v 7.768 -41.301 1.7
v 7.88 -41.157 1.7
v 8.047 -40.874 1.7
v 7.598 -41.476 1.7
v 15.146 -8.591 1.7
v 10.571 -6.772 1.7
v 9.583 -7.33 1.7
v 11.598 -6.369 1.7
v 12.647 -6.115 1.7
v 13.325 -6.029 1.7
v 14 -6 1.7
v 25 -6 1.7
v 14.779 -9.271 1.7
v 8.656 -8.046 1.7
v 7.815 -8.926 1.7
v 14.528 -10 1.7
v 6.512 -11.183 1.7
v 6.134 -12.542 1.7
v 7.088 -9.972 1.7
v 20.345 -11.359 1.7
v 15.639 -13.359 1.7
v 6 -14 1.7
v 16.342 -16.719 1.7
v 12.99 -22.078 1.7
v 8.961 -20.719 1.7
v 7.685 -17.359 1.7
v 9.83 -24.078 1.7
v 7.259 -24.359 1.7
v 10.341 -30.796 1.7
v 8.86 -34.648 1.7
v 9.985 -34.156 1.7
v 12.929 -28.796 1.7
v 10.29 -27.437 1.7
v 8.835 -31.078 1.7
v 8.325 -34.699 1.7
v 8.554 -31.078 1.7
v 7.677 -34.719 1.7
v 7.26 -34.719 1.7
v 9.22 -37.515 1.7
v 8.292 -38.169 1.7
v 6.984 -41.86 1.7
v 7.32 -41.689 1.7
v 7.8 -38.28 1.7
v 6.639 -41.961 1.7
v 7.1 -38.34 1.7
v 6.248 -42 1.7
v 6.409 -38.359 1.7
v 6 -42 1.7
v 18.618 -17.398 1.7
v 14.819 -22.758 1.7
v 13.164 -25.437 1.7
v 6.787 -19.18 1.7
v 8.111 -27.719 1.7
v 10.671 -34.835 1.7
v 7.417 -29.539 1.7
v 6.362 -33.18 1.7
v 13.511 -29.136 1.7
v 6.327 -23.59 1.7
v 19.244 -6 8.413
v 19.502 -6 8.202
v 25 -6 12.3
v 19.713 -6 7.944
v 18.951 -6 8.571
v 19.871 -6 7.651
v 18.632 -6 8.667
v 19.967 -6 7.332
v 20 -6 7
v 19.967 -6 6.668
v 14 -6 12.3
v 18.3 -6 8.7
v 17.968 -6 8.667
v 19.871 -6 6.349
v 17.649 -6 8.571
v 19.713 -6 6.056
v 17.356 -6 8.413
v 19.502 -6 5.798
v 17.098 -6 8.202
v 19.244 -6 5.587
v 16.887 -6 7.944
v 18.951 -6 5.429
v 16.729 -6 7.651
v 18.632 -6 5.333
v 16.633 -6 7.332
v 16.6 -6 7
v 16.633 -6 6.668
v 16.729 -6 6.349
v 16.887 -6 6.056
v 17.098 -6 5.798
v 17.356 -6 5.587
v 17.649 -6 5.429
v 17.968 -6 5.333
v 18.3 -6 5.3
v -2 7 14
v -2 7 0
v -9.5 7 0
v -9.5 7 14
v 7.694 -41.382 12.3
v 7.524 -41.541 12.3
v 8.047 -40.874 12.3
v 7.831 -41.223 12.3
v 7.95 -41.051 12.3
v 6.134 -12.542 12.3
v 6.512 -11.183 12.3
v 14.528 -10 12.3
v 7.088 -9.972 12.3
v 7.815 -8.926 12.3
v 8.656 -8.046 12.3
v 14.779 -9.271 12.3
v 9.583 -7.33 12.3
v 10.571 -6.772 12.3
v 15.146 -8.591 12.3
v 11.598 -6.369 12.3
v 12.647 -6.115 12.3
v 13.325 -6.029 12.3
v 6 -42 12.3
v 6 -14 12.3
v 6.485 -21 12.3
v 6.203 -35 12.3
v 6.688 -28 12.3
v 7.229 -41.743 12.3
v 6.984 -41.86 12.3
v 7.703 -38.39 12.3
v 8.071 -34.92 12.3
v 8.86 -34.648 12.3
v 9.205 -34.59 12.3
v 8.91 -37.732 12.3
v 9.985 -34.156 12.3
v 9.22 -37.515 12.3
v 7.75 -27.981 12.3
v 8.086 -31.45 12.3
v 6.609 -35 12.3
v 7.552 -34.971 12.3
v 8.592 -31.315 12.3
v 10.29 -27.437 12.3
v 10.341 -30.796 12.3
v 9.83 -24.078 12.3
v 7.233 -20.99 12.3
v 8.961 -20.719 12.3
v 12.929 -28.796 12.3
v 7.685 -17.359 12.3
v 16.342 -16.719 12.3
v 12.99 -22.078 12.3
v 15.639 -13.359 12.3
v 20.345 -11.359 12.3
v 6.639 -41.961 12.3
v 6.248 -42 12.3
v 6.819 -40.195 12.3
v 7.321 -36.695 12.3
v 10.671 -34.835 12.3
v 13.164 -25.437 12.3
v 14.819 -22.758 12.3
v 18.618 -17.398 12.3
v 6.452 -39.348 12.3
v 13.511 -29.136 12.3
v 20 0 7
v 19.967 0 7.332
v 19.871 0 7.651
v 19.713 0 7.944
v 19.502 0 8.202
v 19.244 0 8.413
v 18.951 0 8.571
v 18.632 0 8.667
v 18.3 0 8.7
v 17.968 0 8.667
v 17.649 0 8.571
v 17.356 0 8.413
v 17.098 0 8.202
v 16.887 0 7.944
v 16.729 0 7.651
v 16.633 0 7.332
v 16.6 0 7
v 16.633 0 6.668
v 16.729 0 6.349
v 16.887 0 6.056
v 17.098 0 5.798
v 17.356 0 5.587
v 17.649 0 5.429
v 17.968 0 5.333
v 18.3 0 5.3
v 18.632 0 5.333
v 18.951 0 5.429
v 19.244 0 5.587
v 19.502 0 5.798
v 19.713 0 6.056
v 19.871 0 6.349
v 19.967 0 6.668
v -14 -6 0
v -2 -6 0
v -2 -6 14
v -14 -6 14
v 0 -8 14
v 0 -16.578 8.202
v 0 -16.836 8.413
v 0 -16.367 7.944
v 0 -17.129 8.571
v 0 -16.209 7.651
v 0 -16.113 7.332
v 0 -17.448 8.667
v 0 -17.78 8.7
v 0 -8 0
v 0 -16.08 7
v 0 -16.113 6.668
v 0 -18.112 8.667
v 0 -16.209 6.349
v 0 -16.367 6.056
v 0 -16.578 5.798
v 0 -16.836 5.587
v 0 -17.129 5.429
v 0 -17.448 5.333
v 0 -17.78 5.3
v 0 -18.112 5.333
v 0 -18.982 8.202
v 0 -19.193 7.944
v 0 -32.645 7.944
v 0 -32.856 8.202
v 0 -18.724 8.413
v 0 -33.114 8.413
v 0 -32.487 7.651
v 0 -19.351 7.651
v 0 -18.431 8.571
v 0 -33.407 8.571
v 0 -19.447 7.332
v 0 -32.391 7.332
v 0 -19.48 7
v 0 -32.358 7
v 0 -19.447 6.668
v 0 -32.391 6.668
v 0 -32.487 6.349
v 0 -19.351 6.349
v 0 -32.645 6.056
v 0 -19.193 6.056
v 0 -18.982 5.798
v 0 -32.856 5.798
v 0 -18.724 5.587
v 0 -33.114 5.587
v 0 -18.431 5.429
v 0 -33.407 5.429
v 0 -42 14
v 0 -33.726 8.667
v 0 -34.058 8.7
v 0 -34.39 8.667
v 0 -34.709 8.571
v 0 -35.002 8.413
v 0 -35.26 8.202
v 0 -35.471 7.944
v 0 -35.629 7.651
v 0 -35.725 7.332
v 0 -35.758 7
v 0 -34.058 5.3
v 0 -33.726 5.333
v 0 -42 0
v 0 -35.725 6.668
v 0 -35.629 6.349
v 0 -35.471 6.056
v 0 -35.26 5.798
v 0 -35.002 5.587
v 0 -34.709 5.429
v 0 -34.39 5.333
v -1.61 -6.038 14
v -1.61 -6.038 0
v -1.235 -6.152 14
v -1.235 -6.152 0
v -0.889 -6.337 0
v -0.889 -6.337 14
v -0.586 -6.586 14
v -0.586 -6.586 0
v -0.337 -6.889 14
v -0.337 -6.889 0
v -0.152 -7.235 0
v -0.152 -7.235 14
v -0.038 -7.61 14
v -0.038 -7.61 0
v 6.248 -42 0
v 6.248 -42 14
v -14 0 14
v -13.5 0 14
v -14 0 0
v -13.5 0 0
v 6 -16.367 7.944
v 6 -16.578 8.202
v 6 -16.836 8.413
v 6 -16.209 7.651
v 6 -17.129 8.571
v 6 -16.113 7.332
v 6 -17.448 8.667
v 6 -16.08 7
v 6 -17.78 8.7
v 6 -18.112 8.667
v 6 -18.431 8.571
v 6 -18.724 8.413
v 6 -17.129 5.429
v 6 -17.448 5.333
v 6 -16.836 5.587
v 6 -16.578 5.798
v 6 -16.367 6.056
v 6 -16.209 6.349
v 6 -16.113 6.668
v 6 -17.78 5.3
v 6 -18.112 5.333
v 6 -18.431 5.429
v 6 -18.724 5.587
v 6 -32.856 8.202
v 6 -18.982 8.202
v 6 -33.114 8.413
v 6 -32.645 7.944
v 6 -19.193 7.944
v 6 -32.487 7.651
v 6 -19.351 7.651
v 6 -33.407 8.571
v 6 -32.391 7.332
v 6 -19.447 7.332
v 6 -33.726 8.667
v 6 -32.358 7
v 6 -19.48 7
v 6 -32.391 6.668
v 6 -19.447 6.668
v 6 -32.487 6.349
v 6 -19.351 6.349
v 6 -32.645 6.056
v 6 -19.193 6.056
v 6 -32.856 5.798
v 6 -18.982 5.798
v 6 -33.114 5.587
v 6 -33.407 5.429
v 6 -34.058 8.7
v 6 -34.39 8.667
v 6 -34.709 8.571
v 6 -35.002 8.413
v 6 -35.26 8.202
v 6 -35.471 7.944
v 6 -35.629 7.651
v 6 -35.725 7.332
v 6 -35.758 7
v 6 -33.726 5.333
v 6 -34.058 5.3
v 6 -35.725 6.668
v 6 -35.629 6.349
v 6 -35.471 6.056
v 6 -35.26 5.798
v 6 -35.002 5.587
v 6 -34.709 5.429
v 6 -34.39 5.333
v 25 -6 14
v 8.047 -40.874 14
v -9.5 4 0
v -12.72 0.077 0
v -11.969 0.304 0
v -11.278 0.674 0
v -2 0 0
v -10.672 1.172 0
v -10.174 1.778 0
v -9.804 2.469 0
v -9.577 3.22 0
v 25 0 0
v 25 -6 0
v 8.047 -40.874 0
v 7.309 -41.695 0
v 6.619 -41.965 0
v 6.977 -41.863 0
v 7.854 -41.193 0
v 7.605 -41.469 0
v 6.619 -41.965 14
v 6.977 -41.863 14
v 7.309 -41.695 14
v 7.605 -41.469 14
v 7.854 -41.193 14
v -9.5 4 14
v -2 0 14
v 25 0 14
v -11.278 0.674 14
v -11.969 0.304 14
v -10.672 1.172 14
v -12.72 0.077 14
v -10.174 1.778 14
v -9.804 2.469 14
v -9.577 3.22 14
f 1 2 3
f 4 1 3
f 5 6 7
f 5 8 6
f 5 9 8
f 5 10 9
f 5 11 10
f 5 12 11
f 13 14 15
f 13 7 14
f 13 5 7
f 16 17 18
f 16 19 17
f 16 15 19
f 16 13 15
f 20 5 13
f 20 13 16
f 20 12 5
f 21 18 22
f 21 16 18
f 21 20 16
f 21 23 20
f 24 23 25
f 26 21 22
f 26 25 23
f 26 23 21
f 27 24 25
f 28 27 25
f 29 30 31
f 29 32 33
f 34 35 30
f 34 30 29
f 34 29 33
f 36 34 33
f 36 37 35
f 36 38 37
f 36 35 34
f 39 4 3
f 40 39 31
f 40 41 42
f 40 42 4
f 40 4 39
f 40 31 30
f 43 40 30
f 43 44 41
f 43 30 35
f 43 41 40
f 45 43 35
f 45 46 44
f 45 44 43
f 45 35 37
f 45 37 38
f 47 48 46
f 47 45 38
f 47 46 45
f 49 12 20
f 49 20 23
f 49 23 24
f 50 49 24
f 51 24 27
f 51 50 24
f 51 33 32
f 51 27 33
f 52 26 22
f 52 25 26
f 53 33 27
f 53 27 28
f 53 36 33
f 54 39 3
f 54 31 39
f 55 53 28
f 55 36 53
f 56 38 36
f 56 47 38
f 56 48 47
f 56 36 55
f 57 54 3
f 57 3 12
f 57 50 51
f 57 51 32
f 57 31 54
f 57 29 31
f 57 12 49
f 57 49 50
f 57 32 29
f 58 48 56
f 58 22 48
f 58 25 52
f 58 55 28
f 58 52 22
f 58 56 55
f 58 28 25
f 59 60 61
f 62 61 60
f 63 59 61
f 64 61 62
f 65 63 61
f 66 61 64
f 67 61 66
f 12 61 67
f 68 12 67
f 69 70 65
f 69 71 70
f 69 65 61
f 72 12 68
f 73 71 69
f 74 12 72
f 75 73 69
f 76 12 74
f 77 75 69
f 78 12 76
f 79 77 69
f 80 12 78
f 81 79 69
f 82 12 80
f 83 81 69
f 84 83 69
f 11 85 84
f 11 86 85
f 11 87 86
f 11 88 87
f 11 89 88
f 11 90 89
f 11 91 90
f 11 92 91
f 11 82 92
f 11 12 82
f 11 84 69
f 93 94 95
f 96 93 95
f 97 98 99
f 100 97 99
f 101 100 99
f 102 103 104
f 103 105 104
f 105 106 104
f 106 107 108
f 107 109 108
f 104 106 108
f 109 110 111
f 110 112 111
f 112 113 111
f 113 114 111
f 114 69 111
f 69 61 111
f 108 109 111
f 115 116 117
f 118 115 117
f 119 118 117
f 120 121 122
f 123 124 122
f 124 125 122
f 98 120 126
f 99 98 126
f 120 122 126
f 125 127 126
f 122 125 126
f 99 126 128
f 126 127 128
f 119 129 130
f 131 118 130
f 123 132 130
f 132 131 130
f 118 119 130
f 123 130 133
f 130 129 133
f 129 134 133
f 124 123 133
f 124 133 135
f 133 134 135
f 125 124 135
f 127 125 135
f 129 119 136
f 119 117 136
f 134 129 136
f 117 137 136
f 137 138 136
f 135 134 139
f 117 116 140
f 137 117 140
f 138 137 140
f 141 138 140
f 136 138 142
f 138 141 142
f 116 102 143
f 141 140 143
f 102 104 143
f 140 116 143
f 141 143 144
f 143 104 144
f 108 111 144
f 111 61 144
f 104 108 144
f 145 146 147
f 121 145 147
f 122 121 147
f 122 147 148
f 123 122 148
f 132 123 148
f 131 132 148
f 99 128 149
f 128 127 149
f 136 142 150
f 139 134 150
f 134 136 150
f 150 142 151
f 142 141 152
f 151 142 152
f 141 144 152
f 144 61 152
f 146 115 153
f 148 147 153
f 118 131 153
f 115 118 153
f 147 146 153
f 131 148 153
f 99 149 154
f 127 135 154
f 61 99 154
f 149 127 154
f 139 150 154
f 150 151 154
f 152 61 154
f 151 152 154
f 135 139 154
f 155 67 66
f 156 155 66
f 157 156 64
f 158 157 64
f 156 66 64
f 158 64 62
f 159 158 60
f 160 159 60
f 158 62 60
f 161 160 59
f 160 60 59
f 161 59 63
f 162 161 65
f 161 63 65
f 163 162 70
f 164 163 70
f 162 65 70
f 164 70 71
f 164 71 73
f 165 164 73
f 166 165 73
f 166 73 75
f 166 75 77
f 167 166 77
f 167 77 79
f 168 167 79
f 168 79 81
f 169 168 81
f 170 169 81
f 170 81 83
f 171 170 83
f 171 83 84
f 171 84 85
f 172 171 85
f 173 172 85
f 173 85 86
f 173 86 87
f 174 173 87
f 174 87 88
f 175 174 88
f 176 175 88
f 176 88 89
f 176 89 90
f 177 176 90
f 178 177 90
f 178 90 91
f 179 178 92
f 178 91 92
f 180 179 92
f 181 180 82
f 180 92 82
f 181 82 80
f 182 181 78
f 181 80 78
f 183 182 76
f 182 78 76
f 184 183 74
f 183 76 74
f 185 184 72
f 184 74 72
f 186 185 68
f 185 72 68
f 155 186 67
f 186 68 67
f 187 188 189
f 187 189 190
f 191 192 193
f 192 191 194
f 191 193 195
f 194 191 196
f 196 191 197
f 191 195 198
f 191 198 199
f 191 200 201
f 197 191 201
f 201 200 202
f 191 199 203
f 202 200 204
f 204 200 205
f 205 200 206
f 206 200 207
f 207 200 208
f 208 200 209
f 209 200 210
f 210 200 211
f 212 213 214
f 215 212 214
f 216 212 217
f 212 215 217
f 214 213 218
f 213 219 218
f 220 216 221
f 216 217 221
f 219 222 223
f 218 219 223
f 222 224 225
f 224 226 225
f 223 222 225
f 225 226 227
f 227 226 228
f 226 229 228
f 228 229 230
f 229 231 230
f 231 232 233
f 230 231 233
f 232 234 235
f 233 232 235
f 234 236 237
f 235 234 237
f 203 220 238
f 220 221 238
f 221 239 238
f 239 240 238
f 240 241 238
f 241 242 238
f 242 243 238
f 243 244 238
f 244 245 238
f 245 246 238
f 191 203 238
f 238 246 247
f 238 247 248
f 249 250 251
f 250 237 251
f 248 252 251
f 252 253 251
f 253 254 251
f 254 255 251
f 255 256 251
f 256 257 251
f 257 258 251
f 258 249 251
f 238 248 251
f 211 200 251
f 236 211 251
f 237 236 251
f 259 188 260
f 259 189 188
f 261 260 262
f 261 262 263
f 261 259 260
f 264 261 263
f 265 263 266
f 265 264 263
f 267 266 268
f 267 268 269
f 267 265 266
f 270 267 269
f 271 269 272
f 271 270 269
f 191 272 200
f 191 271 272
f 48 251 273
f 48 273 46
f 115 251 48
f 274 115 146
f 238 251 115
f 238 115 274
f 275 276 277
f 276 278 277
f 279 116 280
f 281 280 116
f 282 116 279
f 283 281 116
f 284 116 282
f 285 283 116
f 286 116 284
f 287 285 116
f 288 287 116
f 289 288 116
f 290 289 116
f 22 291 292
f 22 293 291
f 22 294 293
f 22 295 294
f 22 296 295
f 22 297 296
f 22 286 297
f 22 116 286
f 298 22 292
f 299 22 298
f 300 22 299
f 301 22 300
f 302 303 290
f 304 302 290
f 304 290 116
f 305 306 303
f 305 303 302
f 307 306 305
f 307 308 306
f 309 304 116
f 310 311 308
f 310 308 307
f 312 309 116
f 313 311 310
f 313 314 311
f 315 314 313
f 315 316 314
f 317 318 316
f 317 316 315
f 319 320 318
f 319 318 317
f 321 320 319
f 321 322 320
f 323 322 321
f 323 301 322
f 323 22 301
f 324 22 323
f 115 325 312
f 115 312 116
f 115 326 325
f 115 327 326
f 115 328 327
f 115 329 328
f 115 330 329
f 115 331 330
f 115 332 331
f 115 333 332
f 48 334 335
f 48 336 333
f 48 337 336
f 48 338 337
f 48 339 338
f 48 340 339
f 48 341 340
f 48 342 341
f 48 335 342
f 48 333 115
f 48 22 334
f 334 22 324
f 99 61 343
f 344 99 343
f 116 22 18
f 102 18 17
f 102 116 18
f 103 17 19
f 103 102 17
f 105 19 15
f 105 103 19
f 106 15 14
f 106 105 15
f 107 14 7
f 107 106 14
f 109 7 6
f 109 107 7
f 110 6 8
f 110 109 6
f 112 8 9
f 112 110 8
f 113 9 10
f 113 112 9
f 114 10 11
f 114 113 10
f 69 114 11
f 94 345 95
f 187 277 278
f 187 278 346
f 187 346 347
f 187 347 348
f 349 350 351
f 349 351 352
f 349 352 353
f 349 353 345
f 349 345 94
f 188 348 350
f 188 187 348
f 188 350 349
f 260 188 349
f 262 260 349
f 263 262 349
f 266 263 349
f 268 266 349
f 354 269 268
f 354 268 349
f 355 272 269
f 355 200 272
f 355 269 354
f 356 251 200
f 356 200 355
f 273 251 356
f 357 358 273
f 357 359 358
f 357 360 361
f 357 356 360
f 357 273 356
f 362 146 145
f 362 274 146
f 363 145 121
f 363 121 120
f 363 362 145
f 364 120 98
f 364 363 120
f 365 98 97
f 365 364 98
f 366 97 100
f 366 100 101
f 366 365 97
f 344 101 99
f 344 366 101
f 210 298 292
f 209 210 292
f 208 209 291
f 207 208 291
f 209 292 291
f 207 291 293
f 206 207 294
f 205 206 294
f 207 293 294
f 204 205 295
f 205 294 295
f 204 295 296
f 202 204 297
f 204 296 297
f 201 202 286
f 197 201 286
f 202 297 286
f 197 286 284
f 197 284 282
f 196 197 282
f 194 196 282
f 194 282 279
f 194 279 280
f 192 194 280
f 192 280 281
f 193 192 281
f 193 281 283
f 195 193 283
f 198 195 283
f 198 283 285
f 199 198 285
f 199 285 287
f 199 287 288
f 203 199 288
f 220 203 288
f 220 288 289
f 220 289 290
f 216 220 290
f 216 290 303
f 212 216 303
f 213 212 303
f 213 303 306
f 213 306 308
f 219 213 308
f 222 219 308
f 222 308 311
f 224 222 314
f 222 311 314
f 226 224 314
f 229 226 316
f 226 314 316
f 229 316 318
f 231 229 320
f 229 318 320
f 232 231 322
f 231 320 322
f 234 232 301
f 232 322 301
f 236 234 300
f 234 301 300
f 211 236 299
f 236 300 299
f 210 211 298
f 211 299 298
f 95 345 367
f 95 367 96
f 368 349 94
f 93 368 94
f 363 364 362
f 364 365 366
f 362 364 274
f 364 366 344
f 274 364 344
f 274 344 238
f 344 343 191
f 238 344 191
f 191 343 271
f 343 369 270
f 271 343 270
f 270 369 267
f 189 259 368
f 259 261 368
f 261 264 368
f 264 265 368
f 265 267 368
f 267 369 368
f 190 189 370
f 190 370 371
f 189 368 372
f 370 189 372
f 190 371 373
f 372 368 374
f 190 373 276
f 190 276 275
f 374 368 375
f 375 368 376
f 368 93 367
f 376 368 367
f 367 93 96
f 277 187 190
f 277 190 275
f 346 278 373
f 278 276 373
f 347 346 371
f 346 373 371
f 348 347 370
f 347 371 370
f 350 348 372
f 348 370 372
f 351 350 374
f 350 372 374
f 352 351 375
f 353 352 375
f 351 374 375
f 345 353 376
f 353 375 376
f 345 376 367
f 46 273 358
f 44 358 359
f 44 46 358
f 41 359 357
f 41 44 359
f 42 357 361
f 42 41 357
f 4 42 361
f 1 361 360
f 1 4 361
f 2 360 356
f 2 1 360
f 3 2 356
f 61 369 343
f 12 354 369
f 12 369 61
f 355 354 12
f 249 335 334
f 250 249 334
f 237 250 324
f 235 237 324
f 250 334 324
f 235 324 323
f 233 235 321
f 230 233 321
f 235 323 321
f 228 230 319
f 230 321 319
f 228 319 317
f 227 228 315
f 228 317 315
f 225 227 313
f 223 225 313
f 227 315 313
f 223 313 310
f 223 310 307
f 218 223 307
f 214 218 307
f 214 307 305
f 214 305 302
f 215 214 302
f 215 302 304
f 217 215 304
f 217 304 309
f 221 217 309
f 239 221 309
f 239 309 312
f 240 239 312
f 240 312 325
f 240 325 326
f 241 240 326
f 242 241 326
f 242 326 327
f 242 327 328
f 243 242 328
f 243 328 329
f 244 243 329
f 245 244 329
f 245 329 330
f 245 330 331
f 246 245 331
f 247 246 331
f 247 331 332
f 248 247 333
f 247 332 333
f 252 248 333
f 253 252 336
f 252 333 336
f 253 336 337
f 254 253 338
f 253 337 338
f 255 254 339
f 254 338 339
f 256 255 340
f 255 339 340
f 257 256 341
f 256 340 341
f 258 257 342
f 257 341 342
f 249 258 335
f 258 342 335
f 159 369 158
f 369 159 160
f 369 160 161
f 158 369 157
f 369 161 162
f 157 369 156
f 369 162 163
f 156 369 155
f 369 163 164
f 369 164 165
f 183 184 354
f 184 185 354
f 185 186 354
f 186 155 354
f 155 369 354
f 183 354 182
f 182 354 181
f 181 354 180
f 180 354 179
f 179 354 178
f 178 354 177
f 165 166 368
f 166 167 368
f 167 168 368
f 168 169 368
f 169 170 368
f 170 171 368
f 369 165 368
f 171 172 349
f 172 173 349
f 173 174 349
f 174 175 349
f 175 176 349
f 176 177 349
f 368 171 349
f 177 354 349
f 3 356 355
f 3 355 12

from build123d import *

# Parameters (mm, degrees)
BOSS_EXTRUDE1_DEPTH = 14
SKETCH2_R           = 1.7
CUT_EXTRUDE1_DEPTH  = 10
SKETCH3_R           = 1.7
CUT_EXTRUDE2_DEPTH  = 10
SKETCH14_W          = 14
SKETCH14_H          = 6
BOSS_EXTRUDE3_DEPTH = 14
FILLET8_R           = 2
SKETCH17_W          = 1.5
SKETCH17_H          = 1.7
SKETCH18_W          = 19
SKETCH18_H          = 1.7
SKETCH20_W          = 19
SKETCH20_H          = 1.7
SKETCH19_W          = 1.5
SKETCH19_H          = 1.7
FILLET9_R           = 8
SKETCH21_W          = 7.5
SKETCH21_H          = 7
BOSS_EXTRUDE4_DEPTH = 14
FILLET10_R          = 4
FILLET11_R          = 2
FILLET12_R          = 2


with BuildPart() as part:
    # Sketch1 → Boss-Extrude1 (new body)
    with BuildSketch(Plane.XY):
        Polygon((0, 0), (25, 0), (25, -6), (6, -6), (6, -42), (0, -42), (0, -5.547169811), align=None)
    extrude(amount=BOSS_EXTRUDE1_DEPTH)

    # Sketch2 → Cut-Extrude1 (cut)
    with BuildSketch(Plane(origin=(6, 0, 0), x_dir=(0, 0, -1), z_dir=(1, 0, 0))):
        with Locations((-7, -17.78)):
            Circle(SKETCH2_R)
        with Locations((-7, -34.058)):
            Circle(SKETCH2_R)
    extrude(amount=-CUT_EXTRUDE1_DEPTH, mode=Mode.SUBTRACT)

    # Sketch3 → Cut-Extrude2 (cut)
    with BuildSketch(Plane.XZ.offset(6)):
        with Locations((18.3, 7)):
            Circle(SKETCH3_R)
    extrude(amount=-CUT_EXTRUDE2_DEPTH, mode=Mode.SUBTRACT)

    # Sketch14 → Boss-Extrude3 (add)
    with BuildSketch(Plane(origin=(0, 0, 0), x_dir=(-1, 0, 0), z_dir=(0, 0, -1))):
        with Locations((7, -3)):
            Rectangle(SKETCH14_W, SKETCH14_H)
    extrude(amount=-BOSS_EXTRUDE3_DEPTH)

    # Fillet8
    fillet8_edges = [part.edges().sort_by_distance(p)[0] for p in [
        (0, -6, 7),
    ]]
    fillet(fillet8_edges, radius=FILLET8_R)

    # Sketch17 → Loft2 section 0
    with BuildSketch(Plane.XZ.offset(42)):
        with Locations((6.75, 13.15)):
            Rectangle(SKETCH17_W, SKETCH17_H)
    # Sketch18 → Loft2 section 1
    with BuildSketch(Plane.XZ.offset(6)):
        with Locations((15.5, 13.15)):
            Rectangle(SKETCH18_W, SKETCH18_H)
    loft()

    # Sketch20 → Loft3 section 0
    with BuildSketch(Plane.XZ.offset(6)):
        with Locations((15.5, 0.85)):
            Rectangle(SKETCH20_W, SKETCH20_H)
    # Sketch19 → Loft3 section 1
    with BuildSketch(Plane.XZ.offset(42)):
        with Locations((6.75, 0.85)):
            Rectangle(SKETCH19_W, SKETCH19_H)
    loft()

    # Fillet9
    fillet9_edges = [part.edges().sort_by_distance(p)[0] for p in [
        (6, -6, 7),
    ]]
    fillet(fillet9_edges, radius=FILLET9_R)

    # Sketch21 → Boss-Extrude4 (add)
    with BuildSketch(Plane(origin=(0, 0, 0), x_dir=(-1, 0, 0), z_dir=(0, 0, -1))):
        with Locations((5.75, 3.5)):
            Rectangle(SKETCH21_W, SKETCH21_H)
    extrude(amount=-BOSS_EXTRUDE4_DEPTH)

    # Fillet10
    fillet10_edges = [part.edges().sort_by_distance(p)[0] for p in [
        (-9.5, 0, 7),
    ]]
    fillet(fillet10_edges, radius=FILLET10_R)

    # Fillet11
    fillet11_edges = [part.edges().sort_by_distance(p)[0] for p in [
        (7.5, -42, 0.85),
    ]]
    fillet(fillet11_edges, radius=FILLET11_R)

    # Fillet12
    fillet12_edges = [part.edges().sort_by_distance(p)[0] for p in [
        (7.5, -42, 13.15),
    ]]
    fillet(fillet12_edges, radius=FILLET12_R)


solid = part.part
